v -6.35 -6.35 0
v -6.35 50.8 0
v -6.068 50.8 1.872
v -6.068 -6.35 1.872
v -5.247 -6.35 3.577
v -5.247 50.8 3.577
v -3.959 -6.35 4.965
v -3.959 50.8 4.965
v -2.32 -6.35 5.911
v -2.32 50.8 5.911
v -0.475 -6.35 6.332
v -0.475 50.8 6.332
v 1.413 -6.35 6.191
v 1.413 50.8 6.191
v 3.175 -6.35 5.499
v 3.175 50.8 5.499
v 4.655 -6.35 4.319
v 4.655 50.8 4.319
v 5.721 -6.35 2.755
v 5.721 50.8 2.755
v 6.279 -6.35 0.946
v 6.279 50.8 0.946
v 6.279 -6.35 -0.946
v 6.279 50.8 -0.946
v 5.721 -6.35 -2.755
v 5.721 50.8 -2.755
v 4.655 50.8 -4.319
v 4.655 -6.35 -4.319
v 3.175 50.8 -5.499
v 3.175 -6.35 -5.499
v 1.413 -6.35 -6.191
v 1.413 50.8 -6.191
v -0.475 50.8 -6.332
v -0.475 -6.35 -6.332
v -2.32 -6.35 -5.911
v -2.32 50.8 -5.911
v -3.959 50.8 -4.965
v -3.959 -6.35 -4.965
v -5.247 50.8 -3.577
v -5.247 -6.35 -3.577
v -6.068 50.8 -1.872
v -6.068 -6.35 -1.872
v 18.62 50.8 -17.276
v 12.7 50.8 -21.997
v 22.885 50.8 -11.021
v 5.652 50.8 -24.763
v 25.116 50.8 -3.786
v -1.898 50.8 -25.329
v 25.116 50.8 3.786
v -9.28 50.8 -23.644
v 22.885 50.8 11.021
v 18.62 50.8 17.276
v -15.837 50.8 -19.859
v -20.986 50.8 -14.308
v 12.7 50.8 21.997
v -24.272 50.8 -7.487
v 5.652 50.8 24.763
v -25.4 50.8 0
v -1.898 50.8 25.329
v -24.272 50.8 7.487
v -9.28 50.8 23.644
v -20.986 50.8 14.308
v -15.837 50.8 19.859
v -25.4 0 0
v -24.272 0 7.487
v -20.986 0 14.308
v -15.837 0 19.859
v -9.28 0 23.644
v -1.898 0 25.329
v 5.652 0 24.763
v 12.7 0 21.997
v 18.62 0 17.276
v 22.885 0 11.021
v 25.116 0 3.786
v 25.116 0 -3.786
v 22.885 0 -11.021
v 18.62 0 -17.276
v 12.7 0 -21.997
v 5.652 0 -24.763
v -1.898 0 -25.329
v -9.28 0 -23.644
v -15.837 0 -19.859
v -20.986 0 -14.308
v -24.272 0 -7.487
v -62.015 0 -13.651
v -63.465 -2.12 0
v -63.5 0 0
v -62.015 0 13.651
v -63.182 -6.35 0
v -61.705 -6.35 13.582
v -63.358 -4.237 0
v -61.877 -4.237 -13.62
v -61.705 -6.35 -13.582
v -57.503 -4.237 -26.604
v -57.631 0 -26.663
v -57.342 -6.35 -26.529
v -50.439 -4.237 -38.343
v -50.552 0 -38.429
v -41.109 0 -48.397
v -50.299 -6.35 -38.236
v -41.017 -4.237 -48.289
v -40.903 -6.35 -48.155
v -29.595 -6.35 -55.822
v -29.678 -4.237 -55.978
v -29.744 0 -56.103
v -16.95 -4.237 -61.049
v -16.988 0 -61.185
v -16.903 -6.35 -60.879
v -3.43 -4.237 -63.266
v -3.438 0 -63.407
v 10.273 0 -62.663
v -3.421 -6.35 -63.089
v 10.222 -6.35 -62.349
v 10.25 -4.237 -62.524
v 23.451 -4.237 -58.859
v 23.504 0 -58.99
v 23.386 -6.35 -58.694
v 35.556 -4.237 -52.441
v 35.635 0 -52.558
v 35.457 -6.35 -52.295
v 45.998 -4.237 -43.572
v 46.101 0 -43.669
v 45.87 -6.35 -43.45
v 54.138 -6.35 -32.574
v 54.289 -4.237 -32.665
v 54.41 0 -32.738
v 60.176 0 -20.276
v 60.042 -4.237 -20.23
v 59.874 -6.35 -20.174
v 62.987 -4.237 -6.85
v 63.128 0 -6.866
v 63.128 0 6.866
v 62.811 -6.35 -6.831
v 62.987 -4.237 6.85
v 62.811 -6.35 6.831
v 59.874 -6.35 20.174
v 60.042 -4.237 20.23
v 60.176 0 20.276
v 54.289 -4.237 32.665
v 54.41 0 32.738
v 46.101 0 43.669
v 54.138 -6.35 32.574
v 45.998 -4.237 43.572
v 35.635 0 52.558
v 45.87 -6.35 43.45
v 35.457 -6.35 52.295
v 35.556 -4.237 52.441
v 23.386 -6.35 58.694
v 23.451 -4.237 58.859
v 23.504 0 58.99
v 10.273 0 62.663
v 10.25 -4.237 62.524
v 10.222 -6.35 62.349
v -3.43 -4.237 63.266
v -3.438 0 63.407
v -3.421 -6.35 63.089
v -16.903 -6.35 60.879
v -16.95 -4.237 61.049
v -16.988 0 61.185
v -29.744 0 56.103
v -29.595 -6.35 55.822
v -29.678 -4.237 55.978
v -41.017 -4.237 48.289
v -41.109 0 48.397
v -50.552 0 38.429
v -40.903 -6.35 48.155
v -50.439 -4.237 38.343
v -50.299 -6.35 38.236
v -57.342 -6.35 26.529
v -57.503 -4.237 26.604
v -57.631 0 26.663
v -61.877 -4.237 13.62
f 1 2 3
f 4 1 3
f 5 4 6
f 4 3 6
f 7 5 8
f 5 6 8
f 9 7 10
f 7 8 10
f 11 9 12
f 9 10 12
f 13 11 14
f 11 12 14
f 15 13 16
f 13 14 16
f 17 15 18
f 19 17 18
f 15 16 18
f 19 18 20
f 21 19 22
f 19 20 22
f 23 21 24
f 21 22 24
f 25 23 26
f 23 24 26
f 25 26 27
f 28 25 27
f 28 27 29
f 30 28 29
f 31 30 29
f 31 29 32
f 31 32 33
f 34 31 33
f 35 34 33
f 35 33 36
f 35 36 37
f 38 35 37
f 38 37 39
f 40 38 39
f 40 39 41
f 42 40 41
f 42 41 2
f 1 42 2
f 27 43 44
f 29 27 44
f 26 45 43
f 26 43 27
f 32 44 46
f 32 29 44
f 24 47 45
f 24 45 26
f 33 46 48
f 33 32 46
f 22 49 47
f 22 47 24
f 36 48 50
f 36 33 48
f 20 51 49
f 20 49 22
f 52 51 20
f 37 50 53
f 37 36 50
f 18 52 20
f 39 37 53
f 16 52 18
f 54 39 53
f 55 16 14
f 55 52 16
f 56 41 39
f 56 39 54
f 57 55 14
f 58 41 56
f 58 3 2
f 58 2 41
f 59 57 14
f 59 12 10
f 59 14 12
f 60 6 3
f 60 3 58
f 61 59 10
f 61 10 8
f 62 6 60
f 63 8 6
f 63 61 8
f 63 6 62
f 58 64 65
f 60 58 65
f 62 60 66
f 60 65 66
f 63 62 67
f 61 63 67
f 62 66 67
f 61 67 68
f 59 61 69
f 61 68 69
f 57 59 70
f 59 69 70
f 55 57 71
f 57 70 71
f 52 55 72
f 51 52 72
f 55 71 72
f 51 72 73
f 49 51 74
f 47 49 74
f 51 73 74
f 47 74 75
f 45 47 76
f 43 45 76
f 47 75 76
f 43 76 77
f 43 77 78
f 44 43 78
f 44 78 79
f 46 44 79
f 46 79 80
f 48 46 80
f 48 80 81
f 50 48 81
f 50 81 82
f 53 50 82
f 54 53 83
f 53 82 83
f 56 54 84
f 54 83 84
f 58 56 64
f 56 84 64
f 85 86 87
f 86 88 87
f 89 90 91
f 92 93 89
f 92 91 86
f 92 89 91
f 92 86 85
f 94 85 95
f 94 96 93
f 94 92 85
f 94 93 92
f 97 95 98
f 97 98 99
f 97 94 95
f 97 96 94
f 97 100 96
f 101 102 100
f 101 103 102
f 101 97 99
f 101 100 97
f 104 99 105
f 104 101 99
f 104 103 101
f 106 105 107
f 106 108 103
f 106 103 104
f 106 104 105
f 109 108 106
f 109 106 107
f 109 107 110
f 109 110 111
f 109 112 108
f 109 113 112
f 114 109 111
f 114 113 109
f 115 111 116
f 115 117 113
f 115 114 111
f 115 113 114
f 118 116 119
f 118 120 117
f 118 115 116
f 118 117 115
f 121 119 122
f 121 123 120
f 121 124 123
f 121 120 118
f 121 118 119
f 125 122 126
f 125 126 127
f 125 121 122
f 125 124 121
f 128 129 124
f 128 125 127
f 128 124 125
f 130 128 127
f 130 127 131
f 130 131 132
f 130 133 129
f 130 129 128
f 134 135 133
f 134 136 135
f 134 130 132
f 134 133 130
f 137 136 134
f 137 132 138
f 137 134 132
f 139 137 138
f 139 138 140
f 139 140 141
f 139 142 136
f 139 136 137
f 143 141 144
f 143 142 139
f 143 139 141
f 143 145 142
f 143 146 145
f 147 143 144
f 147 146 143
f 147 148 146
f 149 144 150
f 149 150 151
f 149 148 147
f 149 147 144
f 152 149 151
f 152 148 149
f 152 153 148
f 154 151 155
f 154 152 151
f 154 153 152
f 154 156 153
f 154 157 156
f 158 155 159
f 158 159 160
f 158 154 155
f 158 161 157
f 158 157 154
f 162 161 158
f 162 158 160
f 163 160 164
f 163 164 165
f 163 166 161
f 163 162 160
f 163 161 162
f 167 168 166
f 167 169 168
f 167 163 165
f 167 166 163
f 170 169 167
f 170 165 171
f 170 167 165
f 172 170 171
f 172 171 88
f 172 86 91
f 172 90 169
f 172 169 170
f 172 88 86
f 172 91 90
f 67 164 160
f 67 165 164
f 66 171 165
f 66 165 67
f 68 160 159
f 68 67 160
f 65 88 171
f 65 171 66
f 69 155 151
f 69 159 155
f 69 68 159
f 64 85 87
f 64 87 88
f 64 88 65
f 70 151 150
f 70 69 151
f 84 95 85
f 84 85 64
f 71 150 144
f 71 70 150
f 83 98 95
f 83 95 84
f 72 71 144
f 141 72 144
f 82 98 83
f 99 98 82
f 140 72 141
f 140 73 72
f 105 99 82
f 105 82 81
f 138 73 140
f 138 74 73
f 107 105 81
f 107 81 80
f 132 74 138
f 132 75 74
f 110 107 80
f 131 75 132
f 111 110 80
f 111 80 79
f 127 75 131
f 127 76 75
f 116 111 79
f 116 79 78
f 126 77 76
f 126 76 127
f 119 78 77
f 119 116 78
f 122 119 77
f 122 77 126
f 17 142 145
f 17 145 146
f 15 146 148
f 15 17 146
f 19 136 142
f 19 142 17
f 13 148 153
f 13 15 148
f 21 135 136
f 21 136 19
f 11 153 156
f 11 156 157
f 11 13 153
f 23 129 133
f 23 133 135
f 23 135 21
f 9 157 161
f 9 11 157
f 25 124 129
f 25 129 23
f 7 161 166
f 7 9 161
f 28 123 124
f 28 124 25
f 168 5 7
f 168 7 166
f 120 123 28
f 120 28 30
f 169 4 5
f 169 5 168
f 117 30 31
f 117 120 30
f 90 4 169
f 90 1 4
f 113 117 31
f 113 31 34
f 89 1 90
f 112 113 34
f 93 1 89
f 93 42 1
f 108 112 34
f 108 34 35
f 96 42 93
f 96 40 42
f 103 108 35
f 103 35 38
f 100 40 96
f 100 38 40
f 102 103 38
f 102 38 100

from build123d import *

# Parameters (mm, degrees)
SKETCH2_R           = 25.4
BOSS_EXTRUDE1_DEPTH = 50.8
SKETCH4_R           = 6.35
CUT_EXTRUDE1_DEPTH  = 87.884


with BuildPart() as part:
    # Sketch1 → Revolve2 (revolve)
    with BuildSketch(Plane.XY, mode=Mode.PRIVATE) as revolve2_sk:
        with BuildLine():
            Line((0, 0), (63.5, 0))
            ThreePointArc((63.5, 0), (63.420375643, -3.178986216), (63.181702256, -6.35))
            Line((63.181702256, -6.35), (0, -6.35))
            Line((0, -6.35), (0, 0))
        make_face()
    revolve(revolve2_sk.sketch.rotate(Axis((0, 0, 0), (0, -1, 0)), 180), axis=Axis((0, 0, 0), (0, -1, 0)))

    # Sketch2 → Boss-Extrude1 (add)
    with BuildSketch(Plane(origin=(0, 0, 0), x_dir=(1, 0, 0), z_dir=(0, 1, 0))):
        with Locations(Location((0, 0, 0), (0, 0, 180))):
            Circle(SKETCH2_R)
    extrude(amount=BOSS_EXTRUDE1_DEPTH)

    # Sketch4 → Cut-Extrude1 (cut)
    with BuildSketch(Plane(origin=(0, 50.8, 0), x_dir=(1, 0, 0), z_dir=(0, 1, 0))):
        with Locations(Location((0, 0, 0), (0, 0, 180))):
            Circle(SKETCH4_R)
    extrude(amount=-CUT_EXTRUDE1_DEPTH, mode=Mode.SUBTRACT)


solid = part.part
